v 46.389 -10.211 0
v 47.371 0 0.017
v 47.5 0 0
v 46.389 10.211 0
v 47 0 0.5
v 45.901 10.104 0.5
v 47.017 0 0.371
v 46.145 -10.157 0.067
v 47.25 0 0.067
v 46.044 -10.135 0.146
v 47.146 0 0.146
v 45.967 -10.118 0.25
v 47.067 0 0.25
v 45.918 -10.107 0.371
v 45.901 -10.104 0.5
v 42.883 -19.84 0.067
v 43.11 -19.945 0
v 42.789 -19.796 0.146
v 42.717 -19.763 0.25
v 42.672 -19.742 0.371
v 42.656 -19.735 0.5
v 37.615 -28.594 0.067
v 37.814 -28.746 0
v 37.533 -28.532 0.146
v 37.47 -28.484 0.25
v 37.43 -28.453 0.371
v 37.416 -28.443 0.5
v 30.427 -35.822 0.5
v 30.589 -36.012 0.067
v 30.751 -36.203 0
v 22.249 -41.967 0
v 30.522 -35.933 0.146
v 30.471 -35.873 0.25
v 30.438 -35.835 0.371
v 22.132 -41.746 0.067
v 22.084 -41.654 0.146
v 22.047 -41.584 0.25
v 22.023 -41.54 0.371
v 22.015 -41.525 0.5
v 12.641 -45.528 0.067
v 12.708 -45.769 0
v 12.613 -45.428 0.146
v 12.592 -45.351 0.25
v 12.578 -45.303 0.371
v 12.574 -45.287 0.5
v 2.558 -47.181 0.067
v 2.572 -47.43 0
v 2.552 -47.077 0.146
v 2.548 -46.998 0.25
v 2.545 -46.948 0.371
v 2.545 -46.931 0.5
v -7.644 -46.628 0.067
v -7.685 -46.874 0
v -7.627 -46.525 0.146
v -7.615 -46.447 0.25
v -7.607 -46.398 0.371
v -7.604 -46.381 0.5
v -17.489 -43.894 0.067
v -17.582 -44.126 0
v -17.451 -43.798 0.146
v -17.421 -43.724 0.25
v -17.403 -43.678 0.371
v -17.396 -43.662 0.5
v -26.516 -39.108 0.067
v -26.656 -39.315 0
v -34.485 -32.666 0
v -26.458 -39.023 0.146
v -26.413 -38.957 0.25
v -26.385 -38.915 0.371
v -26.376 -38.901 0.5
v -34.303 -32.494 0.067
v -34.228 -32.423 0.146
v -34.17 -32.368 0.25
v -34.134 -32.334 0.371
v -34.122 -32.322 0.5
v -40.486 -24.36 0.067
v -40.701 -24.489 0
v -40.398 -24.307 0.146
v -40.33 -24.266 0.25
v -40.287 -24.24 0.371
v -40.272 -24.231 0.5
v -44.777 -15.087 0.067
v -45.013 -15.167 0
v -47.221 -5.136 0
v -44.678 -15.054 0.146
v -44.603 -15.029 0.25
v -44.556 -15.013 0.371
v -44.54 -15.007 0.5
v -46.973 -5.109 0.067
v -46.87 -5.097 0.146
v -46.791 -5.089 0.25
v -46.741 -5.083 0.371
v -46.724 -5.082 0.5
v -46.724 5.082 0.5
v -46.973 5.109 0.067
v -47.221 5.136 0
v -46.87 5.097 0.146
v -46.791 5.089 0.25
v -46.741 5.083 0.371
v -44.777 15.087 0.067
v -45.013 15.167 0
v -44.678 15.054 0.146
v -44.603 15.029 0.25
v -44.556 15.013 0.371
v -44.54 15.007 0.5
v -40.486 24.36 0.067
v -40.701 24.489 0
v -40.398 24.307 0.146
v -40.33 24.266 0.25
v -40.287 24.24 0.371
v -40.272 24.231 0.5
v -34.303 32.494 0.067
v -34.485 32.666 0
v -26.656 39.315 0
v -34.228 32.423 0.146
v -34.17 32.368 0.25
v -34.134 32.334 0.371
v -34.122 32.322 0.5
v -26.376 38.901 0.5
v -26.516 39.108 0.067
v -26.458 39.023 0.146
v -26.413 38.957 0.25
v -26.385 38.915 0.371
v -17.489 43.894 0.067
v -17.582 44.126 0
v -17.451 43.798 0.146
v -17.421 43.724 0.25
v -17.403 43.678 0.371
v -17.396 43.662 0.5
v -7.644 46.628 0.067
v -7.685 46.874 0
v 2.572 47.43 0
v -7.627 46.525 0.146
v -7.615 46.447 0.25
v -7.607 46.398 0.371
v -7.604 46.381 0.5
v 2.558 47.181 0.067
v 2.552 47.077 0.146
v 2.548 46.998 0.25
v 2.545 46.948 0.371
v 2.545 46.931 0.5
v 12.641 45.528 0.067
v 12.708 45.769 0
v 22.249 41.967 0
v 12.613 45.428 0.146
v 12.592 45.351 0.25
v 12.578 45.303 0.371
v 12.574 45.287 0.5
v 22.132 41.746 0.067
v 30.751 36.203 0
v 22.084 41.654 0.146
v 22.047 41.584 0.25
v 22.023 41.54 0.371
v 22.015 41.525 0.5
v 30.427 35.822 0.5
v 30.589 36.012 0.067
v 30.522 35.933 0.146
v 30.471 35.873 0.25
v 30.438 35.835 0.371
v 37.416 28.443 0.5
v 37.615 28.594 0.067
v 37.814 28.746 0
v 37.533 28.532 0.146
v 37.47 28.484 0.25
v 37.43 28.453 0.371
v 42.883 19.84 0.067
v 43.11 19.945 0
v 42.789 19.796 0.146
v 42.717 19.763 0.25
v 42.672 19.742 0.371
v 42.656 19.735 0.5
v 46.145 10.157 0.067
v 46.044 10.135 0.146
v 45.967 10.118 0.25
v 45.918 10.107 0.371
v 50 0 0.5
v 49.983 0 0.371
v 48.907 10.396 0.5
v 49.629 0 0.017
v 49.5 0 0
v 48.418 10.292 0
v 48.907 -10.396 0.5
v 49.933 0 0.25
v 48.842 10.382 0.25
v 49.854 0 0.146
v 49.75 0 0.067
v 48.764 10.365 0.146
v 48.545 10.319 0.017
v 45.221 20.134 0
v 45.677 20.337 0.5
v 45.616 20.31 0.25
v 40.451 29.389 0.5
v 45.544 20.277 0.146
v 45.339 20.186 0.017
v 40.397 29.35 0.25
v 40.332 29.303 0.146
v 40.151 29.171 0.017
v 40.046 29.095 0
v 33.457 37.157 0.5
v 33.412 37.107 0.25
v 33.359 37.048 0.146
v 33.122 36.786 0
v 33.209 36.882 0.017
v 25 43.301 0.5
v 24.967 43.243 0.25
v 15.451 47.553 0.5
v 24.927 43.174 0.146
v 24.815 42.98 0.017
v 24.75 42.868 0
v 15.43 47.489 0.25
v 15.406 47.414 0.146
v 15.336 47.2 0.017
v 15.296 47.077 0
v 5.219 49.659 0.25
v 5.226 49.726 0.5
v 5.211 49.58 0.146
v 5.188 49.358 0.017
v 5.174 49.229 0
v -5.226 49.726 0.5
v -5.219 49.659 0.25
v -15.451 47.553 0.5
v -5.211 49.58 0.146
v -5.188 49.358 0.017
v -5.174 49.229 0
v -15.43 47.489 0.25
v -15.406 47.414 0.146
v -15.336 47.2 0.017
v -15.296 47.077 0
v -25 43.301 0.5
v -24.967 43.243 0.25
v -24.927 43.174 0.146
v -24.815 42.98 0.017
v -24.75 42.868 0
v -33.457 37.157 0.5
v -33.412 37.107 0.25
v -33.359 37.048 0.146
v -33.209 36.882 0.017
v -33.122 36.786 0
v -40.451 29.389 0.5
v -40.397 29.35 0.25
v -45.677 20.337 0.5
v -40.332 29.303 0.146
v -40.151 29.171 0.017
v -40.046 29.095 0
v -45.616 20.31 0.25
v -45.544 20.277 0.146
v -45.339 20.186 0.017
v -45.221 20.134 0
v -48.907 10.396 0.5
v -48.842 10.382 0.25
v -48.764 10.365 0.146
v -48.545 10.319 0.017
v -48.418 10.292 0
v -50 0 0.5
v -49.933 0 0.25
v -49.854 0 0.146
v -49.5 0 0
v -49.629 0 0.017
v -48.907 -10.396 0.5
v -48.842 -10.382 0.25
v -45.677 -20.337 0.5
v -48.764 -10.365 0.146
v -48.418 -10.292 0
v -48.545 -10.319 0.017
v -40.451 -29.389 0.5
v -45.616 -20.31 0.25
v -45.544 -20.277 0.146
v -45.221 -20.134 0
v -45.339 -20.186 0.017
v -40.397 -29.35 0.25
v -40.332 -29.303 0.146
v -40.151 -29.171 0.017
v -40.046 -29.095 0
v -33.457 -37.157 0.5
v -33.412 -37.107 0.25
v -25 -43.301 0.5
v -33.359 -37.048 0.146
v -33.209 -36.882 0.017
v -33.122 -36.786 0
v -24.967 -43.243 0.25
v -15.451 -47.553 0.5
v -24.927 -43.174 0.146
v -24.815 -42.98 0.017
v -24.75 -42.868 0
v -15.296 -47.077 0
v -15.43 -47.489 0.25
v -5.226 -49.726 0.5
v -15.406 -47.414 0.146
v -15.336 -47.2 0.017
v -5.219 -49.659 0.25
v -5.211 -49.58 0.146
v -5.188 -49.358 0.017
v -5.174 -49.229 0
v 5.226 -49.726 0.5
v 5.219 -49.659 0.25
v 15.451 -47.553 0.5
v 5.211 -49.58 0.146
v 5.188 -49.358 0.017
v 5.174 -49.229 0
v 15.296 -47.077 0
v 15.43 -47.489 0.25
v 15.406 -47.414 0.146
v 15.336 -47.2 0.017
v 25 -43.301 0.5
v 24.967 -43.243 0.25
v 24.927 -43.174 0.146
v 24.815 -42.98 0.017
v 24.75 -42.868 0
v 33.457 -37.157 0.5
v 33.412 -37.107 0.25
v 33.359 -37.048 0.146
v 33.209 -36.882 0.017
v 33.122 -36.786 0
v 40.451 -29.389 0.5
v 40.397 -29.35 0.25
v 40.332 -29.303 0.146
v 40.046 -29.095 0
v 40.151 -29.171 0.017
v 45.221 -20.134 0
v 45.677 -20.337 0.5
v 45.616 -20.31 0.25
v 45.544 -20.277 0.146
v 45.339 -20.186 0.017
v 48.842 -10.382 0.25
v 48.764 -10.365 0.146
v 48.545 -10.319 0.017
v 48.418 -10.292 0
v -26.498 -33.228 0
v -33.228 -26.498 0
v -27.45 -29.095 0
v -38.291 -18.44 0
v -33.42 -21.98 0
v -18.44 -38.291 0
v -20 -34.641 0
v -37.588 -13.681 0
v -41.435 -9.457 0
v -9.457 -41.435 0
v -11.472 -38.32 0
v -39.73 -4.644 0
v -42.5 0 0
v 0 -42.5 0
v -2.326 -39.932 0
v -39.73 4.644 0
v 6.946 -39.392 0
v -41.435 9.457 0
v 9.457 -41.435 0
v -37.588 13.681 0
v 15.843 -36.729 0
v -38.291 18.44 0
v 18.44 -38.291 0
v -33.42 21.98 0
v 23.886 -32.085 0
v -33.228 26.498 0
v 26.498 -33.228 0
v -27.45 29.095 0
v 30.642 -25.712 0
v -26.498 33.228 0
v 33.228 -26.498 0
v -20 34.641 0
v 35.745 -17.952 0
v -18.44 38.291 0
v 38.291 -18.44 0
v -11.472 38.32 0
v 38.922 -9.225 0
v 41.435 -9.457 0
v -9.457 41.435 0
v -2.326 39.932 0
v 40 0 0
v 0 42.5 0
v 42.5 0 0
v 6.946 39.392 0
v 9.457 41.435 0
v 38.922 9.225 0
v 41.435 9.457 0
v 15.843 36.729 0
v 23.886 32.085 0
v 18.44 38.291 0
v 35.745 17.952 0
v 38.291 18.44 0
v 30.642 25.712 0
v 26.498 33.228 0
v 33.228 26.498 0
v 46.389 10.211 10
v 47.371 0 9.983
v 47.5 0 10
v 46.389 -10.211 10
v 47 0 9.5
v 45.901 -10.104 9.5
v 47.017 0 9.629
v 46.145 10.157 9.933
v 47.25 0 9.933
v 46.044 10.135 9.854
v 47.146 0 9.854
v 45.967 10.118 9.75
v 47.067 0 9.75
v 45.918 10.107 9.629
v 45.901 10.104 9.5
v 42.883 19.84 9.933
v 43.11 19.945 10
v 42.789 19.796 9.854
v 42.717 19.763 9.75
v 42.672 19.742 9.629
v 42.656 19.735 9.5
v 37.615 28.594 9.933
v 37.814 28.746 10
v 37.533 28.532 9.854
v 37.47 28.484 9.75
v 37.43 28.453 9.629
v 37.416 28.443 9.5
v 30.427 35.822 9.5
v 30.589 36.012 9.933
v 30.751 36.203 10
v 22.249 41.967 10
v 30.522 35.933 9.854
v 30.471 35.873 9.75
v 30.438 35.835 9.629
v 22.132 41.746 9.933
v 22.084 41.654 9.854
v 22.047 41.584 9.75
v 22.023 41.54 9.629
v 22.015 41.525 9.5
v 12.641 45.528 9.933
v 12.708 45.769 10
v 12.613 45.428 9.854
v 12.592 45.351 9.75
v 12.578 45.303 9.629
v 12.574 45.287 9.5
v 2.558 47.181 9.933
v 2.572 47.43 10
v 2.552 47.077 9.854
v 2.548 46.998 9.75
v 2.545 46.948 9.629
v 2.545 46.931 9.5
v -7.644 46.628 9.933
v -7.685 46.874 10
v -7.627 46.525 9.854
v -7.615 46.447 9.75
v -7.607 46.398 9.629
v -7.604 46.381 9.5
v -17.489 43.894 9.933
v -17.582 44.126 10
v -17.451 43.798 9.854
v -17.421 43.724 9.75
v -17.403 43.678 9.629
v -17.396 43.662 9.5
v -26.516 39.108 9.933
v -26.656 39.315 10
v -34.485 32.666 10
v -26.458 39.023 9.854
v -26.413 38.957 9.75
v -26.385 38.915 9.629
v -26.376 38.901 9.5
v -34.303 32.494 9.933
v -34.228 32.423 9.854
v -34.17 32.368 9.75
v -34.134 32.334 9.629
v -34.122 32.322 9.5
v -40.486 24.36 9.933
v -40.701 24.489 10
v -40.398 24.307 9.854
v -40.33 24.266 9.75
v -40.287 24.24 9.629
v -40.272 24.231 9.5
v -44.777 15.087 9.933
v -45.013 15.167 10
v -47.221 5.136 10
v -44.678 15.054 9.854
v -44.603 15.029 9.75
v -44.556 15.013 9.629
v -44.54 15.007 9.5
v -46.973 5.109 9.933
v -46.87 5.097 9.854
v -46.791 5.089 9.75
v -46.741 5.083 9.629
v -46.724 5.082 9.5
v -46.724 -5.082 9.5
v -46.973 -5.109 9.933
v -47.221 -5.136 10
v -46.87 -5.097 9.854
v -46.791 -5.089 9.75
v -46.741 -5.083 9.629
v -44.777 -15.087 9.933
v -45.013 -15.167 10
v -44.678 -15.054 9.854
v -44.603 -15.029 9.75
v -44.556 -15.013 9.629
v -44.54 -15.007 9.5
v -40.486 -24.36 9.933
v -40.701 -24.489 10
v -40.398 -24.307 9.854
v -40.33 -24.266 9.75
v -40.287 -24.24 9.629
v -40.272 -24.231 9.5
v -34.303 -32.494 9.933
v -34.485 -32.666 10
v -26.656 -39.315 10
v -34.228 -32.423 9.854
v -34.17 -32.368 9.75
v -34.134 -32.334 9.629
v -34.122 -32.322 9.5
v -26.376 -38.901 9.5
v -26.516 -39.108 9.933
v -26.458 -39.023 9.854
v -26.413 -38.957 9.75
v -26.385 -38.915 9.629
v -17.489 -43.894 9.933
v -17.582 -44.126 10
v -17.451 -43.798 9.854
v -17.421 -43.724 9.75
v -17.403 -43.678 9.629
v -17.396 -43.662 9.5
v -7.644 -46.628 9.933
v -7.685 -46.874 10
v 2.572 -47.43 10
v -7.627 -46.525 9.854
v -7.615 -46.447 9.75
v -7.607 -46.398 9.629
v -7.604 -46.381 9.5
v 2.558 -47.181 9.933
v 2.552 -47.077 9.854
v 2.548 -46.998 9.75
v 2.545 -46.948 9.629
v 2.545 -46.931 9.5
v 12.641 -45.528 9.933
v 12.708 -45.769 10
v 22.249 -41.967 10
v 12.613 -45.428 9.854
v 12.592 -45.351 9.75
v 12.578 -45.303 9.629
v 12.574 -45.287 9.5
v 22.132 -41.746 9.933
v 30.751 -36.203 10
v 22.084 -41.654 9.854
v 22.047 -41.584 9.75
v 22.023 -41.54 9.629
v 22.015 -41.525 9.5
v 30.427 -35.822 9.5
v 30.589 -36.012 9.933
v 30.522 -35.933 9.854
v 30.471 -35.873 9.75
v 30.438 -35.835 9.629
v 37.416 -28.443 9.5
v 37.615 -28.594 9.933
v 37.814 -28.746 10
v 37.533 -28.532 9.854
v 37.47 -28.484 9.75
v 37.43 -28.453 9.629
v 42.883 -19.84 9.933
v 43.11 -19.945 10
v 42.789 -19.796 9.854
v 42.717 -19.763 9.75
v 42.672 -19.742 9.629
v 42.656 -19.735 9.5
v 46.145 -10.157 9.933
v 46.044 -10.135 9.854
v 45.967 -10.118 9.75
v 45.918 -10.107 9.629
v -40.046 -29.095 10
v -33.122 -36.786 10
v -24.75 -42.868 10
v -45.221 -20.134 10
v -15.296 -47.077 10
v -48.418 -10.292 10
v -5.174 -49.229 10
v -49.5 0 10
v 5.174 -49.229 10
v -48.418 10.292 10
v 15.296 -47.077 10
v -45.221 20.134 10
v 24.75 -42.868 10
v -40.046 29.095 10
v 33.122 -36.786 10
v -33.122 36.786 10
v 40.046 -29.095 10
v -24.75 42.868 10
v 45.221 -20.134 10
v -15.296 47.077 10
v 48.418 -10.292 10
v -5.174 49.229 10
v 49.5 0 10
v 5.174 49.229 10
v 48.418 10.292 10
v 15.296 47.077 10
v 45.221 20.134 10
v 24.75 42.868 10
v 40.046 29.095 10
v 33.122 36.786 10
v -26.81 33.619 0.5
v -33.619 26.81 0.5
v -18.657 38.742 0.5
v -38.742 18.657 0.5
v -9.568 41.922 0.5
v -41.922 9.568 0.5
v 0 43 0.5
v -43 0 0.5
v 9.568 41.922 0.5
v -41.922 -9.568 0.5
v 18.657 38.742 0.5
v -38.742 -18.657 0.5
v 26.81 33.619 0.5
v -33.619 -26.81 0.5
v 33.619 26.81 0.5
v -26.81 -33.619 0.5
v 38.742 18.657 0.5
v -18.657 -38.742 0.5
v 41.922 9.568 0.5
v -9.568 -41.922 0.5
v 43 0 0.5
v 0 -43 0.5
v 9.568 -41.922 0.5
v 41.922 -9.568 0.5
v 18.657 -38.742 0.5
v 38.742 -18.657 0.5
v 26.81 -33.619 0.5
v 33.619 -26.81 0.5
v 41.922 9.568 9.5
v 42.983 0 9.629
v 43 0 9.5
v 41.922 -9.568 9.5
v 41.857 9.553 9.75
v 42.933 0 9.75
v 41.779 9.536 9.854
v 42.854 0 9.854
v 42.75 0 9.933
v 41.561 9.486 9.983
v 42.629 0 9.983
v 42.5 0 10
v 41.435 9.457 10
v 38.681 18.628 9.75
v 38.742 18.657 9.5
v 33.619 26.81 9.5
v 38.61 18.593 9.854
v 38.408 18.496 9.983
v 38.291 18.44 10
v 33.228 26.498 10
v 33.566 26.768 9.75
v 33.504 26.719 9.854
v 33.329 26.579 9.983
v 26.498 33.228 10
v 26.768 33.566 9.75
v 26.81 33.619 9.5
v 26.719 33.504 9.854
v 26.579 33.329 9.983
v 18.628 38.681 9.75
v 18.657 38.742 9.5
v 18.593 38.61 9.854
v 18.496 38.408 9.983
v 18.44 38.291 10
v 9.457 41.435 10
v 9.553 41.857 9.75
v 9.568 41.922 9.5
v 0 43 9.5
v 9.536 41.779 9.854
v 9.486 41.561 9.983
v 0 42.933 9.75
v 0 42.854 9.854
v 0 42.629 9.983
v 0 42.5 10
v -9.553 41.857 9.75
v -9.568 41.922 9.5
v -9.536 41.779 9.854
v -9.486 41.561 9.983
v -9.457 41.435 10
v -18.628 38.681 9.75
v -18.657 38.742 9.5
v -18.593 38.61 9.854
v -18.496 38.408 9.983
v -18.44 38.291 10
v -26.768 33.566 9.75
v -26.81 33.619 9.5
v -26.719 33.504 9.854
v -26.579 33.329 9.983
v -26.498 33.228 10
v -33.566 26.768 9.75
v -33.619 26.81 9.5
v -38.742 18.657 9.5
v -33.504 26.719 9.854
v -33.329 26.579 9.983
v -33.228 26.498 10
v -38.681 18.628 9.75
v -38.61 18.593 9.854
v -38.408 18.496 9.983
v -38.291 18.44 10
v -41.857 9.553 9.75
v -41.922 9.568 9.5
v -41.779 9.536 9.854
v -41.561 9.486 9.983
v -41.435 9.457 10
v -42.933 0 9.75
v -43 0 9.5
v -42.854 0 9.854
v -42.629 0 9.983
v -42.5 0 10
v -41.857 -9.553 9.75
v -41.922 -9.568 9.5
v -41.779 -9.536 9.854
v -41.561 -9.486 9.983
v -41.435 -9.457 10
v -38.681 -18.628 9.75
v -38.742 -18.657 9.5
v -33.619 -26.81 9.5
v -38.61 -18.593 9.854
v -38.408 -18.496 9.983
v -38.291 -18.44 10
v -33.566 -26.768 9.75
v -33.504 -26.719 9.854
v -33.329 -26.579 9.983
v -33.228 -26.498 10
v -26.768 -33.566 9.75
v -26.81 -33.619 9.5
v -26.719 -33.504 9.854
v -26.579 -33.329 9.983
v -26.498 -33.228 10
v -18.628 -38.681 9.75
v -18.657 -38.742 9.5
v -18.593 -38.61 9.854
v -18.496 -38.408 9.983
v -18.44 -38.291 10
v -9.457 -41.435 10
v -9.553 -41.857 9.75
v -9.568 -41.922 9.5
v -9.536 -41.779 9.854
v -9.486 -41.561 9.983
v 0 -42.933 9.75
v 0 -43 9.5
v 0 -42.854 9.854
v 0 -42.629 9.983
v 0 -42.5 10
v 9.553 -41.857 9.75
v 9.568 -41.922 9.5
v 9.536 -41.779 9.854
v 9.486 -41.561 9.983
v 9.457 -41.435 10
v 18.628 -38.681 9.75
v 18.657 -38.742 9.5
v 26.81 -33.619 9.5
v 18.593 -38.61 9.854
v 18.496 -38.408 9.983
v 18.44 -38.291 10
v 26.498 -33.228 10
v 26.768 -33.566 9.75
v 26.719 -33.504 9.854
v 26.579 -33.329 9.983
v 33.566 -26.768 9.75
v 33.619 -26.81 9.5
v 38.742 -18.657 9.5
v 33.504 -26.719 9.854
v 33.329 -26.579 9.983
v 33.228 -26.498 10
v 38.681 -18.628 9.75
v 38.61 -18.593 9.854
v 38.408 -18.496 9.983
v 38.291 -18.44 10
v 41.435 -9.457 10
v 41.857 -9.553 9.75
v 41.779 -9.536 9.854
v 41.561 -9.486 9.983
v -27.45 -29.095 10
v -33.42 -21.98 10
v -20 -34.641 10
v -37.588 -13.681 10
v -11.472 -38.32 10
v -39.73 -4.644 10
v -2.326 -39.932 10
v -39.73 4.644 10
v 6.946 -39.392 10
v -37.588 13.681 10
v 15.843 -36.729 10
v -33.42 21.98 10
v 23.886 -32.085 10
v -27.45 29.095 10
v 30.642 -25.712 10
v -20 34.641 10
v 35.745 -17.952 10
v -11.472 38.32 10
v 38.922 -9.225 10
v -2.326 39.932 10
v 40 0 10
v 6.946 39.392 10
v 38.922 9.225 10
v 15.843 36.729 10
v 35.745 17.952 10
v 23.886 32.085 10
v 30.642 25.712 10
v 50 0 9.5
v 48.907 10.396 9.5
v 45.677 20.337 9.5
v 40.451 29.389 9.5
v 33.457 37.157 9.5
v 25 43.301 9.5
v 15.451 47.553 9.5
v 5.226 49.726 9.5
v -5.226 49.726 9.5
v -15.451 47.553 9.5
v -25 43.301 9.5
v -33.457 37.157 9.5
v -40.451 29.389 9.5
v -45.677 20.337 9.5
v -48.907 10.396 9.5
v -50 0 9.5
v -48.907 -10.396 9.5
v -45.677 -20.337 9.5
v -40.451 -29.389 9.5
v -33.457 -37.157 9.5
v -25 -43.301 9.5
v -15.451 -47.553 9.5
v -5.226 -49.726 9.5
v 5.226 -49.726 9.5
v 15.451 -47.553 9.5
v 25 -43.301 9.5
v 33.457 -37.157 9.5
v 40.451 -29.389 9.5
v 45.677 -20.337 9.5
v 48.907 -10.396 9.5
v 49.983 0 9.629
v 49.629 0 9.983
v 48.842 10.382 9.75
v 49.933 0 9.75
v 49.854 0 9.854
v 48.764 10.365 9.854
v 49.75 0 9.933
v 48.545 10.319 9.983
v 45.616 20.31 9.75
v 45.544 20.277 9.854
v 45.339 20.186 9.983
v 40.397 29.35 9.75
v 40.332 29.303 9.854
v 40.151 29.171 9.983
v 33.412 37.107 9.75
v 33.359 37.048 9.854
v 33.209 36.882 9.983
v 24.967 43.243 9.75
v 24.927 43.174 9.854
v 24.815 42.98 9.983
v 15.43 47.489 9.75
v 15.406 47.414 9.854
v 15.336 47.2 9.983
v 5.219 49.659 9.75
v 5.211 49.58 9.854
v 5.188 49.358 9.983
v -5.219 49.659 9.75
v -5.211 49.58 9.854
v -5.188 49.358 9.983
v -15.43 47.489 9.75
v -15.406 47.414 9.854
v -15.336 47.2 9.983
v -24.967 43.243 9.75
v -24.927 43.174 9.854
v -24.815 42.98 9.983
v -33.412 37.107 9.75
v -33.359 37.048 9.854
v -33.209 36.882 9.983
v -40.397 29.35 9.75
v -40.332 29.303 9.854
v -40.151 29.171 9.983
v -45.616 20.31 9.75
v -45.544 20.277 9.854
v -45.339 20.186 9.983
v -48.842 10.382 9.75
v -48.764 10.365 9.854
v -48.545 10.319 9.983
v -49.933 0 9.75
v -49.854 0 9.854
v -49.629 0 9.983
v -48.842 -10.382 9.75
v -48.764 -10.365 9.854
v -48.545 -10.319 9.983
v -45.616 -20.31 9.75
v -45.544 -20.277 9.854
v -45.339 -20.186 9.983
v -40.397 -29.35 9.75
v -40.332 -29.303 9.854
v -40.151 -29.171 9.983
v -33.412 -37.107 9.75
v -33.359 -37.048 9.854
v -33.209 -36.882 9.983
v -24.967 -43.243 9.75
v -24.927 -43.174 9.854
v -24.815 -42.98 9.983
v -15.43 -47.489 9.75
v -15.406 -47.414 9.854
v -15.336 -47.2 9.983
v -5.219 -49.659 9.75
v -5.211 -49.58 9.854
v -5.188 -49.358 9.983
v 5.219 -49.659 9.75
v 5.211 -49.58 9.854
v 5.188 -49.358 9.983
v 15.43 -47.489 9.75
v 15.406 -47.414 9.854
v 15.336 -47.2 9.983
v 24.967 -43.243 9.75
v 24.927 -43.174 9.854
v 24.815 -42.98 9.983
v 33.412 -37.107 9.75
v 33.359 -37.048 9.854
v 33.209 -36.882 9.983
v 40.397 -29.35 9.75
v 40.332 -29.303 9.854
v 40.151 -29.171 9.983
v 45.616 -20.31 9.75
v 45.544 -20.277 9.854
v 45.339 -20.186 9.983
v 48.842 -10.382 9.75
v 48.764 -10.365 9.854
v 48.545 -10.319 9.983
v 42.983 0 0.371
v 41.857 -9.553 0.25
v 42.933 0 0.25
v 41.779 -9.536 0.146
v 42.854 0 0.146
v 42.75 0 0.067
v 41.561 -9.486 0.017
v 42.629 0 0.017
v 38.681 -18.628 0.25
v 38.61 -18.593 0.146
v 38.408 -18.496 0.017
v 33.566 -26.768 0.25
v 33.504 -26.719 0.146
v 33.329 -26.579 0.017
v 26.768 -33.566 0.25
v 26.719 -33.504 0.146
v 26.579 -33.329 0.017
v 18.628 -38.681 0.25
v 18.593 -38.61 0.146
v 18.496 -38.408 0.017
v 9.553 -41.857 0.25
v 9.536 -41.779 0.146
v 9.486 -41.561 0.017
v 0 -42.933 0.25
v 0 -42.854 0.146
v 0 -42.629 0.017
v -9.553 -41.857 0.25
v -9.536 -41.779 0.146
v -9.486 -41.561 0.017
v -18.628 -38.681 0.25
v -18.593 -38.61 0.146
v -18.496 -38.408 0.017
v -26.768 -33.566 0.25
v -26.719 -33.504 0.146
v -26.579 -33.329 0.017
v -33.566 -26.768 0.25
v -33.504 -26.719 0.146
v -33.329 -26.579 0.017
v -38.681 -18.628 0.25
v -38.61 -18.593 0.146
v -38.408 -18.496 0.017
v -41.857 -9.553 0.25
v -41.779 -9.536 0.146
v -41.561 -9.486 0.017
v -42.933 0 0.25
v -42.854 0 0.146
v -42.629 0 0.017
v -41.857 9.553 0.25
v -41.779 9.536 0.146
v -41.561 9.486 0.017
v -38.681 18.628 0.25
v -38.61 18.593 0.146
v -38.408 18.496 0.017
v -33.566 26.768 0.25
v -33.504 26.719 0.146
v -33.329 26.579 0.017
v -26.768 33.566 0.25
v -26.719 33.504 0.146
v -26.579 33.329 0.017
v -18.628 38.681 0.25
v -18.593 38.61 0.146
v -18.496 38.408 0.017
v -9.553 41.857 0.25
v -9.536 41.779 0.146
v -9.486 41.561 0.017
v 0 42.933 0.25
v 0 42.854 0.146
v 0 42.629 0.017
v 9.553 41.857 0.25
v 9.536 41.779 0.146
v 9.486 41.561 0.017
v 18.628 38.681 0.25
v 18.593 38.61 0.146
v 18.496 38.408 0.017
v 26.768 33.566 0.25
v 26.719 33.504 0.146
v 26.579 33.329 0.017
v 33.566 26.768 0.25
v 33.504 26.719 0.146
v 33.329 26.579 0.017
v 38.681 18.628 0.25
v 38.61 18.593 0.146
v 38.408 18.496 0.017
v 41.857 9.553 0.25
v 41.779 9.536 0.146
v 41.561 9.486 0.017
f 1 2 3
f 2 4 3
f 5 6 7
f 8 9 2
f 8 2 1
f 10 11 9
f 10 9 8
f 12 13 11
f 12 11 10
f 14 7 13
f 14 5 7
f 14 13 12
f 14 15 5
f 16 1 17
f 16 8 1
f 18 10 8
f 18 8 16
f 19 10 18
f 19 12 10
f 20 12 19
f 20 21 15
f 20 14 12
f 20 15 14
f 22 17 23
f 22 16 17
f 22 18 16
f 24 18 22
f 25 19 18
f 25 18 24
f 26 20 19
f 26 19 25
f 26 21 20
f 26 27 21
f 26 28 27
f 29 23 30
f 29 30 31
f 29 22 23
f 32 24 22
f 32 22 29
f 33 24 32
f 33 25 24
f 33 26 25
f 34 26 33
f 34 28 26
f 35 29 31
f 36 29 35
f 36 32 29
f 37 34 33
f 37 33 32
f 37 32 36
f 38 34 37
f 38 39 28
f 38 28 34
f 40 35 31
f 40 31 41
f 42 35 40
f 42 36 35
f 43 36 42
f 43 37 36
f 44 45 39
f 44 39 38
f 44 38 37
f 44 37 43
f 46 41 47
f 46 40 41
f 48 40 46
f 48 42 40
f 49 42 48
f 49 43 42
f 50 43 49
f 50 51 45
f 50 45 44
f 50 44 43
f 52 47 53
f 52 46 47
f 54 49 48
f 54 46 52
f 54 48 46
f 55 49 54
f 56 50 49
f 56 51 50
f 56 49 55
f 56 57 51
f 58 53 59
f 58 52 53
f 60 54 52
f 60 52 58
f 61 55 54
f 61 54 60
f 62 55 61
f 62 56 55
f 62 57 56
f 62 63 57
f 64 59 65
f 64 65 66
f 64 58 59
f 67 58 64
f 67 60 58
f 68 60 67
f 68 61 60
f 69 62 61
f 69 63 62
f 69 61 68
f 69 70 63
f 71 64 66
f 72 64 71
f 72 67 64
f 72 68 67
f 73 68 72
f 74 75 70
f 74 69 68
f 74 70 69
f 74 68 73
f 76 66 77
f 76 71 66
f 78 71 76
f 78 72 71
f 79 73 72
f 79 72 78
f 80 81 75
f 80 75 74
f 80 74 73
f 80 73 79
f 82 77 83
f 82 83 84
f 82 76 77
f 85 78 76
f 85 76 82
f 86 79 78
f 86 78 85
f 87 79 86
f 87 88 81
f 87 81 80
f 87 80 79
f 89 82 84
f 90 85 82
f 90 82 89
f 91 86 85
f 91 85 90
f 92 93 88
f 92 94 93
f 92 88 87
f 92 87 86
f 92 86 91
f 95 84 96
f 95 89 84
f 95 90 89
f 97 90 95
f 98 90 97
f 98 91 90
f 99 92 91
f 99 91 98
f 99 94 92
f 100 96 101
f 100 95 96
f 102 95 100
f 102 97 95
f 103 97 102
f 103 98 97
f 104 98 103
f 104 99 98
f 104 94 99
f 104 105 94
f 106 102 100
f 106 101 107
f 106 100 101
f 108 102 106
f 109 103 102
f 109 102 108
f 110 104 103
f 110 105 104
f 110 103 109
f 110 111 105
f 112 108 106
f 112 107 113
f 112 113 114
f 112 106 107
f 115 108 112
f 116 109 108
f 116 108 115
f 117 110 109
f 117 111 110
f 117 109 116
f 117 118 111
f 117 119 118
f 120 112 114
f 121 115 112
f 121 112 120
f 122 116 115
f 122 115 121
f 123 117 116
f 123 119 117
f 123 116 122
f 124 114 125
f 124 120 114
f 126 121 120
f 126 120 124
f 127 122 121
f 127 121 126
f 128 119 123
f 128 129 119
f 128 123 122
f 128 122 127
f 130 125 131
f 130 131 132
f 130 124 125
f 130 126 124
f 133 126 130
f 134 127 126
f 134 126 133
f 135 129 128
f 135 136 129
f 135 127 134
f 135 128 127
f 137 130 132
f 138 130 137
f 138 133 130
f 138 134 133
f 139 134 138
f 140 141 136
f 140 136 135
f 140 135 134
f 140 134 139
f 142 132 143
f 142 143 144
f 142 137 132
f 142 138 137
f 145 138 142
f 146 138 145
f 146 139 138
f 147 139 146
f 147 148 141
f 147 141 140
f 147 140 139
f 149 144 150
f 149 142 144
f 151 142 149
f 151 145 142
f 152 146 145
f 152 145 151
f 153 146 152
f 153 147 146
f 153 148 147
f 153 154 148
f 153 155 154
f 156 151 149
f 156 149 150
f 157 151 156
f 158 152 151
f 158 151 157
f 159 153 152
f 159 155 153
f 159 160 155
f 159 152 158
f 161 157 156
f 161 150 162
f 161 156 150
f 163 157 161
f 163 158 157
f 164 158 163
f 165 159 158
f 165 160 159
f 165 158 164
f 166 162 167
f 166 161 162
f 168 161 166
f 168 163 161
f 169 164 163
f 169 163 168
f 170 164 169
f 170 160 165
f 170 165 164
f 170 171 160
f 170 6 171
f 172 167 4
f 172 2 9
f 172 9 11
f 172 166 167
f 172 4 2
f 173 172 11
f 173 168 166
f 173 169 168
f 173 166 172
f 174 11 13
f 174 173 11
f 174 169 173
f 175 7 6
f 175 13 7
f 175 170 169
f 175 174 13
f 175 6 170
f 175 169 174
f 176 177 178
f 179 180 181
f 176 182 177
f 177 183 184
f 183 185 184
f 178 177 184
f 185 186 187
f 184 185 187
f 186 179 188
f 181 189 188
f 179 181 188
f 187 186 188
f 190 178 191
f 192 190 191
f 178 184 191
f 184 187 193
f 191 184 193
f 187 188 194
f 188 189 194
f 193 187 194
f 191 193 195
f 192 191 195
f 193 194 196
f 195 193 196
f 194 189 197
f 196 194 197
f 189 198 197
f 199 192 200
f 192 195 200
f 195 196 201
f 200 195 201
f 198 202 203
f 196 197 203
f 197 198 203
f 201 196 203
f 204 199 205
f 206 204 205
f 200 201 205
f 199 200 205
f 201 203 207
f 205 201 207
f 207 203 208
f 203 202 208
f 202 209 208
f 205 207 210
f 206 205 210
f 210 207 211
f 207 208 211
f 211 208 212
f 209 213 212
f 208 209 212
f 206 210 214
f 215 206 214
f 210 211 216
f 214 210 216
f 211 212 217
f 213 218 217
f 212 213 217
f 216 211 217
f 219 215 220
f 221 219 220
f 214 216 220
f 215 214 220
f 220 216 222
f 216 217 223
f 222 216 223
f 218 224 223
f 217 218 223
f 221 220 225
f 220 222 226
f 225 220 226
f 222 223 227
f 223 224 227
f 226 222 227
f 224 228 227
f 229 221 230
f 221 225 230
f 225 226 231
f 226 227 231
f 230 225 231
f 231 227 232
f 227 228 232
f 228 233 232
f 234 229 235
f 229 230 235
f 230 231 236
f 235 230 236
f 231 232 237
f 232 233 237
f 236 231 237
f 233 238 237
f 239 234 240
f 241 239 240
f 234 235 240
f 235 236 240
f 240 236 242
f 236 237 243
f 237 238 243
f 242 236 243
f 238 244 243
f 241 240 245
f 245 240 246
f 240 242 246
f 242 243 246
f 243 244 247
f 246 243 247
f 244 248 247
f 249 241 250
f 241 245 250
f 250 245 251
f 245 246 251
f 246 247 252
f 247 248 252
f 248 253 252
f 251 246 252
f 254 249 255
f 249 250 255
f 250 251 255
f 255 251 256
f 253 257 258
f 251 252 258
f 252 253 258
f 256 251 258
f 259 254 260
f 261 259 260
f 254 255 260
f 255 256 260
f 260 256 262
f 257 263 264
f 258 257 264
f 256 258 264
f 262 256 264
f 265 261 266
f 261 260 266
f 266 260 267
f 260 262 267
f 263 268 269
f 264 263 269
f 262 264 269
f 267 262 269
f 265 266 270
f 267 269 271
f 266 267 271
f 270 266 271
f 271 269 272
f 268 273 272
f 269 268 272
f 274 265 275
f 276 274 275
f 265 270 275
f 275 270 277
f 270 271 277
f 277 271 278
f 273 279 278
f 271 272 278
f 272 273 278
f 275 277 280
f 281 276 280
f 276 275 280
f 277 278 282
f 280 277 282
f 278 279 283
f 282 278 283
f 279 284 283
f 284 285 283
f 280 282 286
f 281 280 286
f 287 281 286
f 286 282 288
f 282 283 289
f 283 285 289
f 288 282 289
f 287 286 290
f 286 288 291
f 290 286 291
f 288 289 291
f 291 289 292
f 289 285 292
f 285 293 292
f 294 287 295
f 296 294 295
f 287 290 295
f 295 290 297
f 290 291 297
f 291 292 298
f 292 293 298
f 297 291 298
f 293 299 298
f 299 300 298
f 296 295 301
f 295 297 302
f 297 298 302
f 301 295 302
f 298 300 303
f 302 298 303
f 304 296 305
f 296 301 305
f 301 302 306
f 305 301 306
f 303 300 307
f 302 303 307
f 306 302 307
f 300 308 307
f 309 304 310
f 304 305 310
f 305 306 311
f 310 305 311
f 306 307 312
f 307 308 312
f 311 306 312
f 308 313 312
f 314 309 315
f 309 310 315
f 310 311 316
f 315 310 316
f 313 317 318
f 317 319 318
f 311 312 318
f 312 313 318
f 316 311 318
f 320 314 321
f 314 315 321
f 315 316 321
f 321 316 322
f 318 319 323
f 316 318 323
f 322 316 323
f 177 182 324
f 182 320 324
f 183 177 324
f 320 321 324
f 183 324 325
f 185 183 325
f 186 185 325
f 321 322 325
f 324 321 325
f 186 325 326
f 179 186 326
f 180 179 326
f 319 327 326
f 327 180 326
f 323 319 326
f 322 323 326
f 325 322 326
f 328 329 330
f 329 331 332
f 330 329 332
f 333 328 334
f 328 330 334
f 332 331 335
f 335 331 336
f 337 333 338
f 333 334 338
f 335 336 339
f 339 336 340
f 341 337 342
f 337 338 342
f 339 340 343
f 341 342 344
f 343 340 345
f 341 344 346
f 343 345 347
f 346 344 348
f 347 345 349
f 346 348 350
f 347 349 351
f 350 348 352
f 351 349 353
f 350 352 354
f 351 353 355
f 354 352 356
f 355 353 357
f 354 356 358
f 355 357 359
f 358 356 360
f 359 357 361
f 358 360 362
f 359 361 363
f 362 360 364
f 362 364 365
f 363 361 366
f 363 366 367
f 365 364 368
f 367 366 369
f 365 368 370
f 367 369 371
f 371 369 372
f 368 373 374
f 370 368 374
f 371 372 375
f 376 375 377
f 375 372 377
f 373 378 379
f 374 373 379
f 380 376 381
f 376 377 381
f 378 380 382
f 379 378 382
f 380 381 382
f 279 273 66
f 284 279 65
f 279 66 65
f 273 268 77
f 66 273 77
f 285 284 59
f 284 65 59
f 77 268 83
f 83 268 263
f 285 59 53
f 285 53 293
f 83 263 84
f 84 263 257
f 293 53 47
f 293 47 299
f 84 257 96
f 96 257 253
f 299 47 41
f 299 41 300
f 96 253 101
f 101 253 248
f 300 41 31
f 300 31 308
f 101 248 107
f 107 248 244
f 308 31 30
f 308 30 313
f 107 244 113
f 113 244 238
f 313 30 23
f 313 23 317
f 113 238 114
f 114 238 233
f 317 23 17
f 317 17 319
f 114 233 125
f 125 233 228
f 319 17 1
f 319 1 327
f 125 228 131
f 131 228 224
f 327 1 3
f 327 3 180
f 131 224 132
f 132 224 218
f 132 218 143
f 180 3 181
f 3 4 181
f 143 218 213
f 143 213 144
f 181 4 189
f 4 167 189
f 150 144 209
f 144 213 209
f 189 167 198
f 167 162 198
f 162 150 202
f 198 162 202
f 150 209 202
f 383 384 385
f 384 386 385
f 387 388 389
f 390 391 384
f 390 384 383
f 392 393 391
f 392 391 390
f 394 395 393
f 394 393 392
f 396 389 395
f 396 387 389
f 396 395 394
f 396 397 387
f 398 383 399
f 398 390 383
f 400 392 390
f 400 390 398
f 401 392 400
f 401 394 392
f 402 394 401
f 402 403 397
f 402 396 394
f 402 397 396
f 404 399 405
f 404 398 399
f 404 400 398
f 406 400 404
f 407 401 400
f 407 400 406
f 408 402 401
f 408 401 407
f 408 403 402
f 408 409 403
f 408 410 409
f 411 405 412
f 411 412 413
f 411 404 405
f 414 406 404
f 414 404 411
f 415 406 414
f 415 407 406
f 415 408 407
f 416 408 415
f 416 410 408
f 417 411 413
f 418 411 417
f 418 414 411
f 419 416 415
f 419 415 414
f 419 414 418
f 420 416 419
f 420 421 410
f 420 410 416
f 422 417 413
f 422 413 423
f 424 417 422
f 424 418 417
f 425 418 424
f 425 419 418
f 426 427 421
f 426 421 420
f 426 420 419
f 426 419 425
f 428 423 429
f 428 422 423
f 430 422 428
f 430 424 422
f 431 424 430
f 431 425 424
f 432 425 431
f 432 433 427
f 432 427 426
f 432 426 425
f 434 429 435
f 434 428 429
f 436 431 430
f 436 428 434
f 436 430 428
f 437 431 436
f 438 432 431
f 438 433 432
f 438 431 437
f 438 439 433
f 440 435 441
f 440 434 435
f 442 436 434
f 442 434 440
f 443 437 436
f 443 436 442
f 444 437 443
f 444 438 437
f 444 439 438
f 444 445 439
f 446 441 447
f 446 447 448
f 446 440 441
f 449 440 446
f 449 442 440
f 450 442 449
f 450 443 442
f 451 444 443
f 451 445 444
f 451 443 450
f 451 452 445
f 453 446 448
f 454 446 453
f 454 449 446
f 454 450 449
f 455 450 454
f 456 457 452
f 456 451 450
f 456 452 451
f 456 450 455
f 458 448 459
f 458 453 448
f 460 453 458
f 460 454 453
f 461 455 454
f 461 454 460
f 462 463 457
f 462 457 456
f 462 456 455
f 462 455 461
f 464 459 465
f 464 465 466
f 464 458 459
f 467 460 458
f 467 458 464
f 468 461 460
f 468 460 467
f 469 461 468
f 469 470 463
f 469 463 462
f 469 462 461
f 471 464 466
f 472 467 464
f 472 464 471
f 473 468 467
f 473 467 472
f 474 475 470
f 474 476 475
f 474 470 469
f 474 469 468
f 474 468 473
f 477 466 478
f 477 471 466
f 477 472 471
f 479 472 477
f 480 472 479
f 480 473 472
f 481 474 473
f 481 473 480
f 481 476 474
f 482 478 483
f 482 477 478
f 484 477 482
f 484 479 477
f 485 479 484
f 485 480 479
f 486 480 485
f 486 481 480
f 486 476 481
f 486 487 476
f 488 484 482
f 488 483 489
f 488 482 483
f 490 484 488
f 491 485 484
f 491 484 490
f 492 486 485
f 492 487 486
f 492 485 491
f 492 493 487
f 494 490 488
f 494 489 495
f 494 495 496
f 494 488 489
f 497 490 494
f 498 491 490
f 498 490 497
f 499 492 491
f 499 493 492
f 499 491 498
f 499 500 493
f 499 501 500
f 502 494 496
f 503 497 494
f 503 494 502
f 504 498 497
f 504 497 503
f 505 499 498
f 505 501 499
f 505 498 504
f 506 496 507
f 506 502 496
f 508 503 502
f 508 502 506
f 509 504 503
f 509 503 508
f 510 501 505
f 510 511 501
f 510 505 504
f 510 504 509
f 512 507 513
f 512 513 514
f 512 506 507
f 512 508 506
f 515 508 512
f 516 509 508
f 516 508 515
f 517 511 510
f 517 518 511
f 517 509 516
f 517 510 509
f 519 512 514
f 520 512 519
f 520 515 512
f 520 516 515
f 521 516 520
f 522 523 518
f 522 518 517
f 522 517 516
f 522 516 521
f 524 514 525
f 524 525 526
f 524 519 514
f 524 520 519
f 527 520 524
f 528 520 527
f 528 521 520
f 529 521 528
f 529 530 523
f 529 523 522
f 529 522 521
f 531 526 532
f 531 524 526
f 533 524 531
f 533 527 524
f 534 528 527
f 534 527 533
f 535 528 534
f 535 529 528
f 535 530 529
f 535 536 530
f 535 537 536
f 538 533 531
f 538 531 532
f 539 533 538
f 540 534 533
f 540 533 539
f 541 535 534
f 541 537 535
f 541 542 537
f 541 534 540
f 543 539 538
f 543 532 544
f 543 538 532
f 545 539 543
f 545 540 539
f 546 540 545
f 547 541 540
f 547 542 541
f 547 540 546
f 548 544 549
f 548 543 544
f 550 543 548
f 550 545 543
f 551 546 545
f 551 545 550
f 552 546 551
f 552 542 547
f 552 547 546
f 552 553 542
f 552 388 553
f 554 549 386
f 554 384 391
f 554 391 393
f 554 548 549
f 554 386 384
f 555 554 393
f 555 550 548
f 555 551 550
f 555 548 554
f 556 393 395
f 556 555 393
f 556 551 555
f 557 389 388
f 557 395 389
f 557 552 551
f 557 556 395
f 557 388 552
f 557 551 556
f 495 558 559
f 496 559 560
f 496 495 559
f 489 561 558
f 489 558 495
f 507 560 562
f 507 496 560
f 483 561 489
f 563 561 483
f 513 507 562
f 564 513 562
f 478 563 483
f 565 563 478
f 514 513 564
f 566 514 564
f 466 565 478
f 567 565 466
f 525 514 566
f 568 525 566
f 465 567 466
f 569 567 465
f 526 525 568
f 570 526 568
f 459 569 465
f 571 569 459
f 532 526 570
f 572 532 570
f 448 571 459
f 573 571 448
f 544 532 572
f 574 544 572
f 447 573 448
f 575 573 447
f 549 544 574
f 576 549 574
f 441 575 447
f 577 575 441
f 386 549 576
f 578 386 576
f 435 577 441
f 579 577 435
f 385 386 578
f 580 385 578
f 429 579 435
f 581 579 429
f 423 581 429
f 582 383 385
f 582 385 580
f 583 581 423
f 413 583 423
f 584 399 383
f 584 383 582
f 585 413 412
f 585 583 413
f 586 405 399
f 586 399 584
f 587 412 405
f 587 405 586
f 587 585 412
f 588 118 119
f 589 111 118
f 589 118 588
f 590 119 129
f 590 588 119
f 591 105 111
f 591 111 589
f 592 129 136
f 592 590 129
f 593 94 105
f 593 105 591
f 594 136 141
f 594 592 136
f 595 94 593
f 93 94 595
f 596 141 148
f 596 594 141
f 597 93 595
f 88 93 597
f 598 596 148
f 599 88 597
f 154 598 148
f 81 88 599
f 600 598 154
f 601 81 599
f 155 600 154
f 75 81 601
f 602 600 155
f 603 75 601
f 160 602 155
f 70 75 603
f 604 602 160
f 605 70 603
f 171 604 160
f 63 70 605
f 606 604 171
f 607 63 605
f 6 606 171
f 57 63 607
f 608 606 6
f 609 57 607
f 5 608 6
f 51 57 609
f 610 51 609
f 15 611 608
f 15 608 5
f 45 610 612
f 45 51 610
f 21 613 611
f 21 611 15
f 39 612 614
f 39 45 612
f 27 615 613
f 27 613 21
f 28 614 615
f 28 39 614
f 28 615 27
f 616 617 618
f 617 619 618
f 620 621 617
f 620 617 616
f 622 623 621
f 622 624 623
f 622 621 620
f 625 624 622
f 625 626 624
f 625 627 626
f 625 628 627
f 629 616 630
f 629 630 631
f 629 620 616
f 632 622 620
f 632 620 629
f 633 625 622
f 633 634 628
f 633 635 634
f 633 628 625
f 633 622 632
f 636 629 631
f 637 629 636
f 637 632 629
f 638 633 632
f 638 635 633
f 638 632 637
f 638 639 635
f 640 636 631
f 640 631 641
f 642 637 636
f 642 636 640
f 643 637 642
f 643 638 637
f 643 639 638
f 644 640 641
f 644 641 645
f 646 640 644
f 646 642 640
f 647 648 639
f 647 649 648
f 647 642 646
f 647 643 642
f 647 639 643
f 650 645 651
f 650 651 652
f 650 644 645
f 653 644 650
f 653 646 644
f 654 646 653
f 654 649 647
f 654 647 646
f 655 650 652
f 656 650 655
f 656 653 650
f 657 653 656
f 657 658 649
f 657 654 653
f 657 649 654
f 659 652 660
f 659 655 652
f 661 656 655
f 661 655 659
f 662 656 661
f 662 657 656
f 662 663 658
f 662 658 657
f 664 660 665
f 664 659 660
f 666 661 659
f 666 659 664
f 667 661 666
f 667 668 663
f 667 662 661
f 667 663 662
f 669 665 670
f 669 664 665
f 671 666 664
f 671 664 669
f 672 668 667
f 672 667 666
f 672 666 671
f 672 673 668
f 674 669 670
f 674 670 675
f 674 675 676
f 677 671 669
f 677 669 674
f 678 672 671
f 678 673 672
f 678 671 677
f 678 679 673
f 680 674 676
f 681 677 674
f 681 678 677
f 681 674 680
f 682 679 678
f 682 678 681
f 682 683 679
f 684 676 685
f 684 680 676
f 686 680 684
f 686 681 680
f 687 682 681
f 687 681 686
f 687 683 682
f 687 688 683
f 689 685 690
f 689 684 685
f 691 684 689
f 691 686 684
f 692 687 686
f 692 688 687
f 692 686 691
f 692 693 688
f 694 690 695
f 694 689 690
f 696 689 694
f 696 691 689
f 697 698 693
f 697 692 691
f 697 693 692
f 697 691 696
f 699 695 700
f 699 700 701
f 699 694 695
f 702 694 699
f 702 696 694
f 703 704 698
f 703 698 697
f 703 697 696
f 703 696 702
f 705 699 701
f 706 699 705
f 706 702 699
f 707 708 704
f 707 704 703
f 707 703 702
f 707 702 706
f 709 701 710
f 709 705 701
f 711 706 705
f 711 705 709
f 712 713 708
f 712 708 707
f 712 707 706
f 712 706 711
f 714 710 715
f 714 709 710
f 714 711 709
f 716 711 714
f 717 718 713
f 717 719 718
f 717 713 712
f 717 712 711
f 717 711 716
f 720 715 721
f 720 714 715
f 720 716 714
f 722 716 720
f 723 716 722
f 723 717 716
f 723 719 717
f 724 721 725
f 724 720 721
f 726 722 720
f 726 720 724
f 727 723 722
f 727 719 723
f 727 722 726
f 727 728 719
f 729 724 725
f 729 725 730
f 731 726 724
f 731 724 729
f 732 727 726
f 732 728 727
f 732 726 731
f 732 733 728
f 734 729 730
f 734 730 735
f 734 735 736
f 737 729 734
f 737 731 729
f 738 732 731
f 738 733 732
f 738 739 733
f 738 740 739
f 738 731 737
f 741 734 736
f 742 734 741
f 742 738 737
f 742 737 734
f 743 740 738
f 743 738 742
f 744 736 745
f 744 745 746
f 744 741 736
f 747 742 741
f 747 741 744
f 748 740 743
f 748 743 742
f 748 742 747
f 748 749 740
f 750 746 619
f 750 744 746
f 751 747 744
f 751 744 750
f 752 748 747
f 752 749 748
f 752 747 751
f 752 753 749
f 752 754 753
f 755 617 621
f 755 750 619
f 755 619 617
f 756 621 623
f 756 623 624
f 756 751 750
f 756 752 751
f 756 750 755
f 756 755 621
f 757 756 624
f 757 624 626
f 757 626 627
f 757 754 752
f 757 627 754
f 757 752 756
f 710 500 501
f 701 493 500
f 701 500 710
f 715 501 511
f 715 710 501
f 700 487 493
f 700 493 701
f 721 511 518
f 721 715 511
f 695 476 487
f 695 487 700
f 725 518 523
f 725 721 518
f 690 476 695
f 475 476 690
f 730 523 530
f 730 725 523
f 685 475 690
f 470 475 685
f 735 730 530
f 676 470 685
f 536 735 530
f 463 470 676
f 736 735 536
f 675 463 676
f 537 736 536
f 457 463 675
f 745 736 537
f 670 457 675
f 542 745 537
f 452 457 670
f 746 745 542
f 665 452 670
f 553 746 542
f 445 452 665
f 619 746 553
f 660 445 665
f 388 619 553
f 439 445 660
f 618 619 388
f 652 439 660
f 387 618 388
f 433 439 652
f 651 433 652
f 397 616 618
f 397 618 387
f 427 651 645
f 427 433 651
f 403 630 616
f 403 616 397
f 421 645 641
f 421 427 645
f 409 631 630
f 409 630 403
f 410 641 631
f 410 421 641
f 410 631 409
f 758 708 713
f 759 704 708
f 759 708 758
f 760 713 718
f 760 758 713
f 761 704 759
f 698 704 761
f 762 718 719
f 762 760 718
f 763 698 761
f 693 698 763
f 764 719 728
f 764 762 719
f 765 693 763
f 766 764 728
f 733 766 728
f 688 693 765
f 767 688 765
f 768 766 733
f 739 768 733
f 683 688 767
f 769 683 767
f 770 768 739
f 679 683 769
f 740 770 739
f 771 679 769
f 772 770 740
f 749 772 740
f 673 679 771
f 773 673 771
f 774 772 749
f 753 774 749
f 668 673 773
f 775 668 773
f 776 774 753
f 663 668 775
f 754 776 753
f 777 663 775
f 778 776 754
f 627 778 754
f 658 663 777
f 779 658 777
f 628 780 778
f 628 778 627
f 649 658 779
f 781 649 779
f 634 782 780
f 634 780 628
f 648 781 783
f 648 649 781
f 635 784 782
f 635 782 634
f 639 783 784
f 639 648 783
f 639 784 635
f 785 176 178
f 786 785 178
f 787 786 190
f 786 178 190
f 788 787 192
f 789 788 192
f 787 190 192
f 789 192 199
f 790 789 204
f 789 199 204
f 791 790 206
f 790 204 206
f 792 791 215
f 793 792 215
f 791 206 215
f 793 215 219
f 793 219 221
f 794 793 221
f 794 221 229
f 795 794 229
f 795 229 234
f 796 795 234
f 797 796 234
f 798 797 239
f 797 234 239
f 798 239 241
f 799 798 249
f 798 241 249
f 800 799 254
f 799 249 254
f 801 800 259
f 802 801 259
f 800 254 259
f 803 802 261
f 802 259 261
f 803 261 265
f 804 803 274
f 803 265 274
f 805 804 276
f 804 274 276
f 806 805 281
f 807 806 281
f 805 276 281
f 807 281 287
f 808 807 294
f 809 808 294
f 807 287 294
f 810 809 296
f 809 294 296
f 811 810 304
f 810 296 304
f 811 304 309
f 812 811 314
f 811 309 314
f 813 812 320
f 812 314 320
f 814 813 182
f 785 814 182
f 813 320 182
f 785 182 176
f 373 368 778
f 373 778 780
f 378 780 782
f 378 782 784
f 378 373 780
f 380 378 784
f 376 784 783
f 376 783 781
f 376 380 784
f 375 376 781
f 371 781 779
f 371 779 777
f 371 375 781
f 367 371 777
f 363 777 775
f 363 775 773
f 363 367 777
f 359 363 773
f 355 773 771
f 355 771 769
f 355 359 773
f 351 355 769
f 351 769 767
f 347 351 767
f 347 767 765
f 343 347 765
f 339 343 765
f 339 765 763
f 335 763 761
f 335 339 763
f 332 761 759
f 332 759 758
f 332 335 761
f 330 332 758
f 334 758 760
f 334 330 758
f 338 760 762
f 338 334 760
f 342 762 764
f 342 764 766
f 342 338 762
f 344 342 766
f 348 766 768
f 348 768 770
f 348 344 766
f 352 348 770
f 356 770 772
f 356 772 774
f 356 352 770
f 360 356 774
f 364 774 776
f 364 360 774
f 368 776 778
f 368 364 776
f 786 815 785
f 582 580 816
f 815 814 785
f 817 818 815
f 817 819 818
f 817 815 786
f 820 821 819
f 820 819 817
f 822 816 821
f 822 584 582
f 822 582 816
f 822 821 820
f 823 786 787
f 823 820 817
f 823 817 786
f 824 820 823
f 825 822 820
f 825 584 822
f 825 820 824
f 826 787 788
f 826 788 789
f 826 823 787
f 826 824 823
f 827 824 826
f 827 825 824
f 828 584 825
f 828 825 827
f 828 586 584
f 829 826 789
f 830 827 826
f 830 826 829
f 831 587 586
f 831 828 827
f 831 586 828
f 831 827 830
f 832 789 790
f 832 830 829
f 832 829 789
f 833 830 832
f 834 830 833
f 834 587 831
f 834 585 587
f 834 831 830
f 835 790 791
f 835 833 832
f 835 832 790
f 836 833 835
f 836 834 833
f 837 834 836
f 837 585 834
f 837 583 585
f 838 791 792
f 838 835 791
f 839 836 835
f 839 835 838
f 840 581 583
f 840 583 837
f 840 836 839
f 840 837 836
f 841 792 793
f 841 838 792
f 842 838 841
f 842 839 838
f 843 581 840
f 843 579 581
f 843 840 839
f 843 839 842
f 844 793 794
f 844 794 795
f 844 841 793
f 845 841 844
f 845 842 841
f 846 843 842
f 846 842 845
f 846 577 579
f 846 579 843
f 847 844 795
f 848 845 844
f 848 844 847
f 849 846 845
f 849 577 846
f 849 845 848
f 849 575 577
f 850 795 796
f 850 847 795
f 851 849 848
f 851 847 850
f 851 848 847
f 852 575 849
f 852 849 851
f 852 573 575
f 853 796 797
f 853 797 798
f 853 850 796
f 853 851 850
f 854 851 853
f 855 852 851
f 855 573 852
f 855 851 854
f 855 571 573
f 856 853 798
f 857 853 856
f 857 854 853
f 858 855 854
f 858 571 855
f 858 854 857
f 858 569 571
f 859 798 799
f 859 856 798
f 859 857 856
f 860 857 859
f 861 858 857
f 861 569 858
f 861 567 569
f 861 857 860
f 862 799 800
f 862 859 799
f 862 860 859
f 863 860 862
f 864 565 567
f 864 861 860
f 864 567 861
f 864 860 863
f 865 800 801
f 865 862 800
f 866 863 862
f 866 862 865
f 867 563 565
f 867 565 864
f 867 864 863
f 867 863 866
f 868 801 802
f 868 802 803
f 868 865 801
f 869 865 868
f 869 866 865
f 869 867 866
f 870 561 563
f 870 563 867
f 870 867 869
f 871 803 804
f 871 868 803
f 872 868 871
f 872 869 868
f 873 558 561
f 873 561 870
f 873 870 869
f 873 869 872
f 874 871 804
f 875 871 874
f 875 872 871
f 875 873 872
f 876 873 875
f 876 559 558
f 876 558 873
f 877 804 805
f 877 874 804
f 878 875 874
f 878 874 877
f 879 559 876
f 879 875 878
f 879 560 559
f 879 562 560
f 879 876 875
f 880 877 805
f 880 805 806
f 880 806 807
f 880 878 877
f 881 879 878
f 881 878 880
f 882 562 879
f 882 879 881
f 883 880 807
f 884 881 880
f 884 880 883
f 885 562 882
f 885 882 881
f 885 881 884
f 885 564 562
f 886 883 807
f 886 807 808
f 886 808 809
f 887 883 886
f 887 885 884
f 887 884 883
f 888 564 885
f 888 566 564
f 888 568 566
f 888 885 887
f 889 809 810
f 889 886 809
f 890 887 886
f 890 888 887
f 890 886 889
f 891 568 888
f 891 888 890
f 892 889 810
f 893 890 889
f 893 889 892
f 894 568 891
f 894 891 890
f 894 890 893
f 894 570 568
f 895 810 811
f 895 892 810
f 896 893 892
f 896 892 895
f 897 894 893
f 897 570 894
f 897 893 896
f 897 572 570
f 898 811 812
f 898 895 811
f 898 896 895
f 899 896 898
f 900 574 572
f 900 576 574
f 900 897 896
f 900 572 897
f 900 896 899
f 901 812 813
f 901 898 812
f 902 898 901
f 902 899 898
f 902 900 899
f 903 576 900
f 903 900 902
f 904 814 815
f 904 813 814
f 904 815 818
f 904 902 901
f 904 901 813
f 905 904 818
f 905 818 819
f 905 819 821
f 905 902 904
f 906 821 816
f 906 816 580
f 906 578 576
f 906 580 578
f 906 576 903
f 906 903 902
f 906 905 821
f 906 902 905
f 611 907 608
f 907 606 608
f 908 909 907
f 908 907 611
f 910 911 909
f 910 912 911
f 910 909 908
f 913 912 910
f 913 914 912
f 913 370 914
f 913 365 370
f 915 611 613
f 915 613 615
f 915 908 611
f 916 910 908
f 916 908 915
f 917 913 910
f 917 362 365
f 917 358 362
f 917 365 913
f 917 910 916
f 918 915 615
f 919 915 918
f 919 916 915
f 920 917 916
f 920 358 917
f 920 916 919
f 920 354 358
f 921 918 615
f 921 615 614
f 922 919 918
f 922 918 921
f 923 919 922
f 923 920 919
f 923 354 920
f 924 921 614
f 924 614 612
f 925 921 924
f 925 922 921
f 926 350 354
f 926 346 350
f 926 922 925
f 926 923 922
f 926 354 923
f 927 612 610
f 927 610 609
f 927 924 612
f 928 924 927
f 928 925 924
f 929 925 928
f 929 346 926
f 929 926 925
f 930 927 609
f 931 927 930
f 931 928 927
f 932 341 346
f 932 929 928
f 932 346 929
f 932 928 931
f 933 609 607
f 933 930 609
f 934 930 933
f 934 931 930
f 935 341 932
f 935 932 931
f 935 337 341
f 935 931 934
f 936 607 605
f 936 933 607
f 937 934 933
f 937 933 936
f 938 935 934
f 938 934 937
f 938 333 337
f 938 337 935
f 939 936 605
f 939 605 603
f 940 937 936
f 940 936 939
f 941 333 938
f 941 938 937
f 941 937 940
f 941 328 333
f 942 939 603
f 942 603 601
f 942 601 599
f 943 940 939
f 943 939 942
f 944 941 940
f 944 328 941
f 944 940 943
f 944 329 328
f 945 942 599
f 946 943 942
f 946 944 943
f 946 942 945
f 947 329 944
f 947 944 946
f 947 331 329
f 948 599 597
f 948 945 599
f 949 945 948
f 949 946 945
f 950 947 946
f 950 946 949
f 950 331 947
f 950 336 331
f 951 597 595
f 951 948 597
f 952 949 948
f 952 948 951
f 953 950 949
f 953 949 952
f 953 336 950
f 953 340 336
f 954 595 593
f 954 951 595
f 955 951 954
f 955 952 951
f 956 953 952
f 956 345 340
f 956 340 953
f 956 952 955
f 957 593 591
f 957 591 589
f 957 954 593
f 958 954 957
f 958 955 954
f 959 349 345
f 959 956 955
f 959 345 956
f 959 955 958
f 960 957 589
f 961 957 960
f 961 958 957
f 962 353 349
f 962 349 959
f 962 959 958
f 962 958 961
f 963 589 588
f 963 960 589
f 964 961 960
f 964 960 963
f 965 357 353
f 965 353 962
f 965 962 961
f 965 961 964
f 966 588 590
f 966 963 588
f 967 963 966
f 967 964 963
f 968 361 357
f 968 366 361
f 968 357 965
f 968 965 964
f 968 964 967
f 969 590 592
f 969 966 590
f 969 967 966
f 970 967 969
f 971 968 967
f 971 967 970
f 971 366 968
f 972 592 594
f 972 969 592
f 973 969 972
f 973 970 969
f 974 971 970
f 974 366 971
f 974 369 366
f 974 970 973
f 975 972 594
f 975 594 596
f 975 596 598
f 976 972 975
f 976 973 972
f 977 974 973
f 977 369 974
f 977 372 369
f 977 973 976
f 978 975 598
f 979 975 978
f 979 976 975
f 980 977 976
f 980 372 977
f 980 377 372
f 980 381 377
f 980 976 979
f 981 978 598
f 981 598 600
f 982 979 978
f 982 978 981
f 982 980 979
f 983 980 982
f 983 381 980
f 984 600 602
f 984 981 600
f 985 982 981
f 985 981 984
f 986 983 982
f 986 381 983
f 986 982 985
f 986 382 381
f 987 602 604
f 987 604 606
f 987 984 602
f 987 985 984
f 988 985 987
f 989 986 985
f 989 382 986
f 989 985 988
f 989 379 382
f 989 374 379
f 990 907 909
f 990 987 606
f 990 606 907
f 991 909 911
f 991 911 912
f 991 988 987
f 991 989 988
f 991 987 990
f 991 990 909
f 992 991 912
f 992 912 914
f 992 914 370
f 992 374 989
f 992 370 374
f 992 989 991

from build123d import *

# Parameters (mm, degrees)
SKETCH1_R           = 50
SKETCH1_R_2         = 40
BOSS_EXTRUDE1_DEPTH = 10
SKETCH2_R           = 47
SKETCH2_R_2         = 43
CUT_EXTRUDE1_DEPTH  = 0.5
CUT_EXTRUDE2_START  = -0.5
SKETCH3_R           = 47
SKETCH3_R_2         = 43
CUT_EXTRUDE2_DEPTH  = 0.5
FILLET1_R           = 0.5


with BuildPart() as part:
    # Sketch1 → Boss-Extrude1 (new body)
    with BuildSketch(Plane.XY):
        Circle(SKETCH1_R)
        Circle(SKETCH1_R_2, mode=Mode.SUBTRACT)
    extrude(amount=BOSS_EXTRUDE1_DEPTH)

    # Sketch2 → Cut-Extrude1 (cut)
    with BuildSketch(Plane.XY.offset(10)):
        Circle(SKETCH2_R)
        Circle(SKETCH2_R_2, mode=Mode.SUBTRACT)
    extrude(amount=-CUT_EXTRUDE1_DEPTH, mode=Mode.SUBTRACT)

    # Sketch3 → Cut-Extrude2 (cut)
    with BuildSketch(Plane(origin=(0, 0, 0), x_dir=(-1, 0, 0), z_dir=(0, 0, -1)).offset(CUT_EXTRUDE2_START)):
        with Locations(Location((0, 0, 0), (0, 0, 180))):
            Circle(SKETCH3_R)
        with Locations(Location((0, 0, 0), (0, 0, 180))):
            Circle(SKETCH3_R_2, mode=Mode.SUBTRACT)
    extrude(amount=CUT_EXTRUDE2_DEPTH, mode=Mode.SUBTRACT)

    # Fillet1
    fillet1_edges = [part.edges().sort_by_distance(p)[0] for p in [
        (-47, 0, 10),
        (-43, 0, 10),
        (-47, 0, 0),
        (-50, 0, 0),
        (-43, 0, 0),
        (-50, 0, 10),
    ]]
    fillet(fillet1_edges, radius=FILLET1_R - 0.0001)  # a hair under: the kernel refuses the full size


solid = part.part
